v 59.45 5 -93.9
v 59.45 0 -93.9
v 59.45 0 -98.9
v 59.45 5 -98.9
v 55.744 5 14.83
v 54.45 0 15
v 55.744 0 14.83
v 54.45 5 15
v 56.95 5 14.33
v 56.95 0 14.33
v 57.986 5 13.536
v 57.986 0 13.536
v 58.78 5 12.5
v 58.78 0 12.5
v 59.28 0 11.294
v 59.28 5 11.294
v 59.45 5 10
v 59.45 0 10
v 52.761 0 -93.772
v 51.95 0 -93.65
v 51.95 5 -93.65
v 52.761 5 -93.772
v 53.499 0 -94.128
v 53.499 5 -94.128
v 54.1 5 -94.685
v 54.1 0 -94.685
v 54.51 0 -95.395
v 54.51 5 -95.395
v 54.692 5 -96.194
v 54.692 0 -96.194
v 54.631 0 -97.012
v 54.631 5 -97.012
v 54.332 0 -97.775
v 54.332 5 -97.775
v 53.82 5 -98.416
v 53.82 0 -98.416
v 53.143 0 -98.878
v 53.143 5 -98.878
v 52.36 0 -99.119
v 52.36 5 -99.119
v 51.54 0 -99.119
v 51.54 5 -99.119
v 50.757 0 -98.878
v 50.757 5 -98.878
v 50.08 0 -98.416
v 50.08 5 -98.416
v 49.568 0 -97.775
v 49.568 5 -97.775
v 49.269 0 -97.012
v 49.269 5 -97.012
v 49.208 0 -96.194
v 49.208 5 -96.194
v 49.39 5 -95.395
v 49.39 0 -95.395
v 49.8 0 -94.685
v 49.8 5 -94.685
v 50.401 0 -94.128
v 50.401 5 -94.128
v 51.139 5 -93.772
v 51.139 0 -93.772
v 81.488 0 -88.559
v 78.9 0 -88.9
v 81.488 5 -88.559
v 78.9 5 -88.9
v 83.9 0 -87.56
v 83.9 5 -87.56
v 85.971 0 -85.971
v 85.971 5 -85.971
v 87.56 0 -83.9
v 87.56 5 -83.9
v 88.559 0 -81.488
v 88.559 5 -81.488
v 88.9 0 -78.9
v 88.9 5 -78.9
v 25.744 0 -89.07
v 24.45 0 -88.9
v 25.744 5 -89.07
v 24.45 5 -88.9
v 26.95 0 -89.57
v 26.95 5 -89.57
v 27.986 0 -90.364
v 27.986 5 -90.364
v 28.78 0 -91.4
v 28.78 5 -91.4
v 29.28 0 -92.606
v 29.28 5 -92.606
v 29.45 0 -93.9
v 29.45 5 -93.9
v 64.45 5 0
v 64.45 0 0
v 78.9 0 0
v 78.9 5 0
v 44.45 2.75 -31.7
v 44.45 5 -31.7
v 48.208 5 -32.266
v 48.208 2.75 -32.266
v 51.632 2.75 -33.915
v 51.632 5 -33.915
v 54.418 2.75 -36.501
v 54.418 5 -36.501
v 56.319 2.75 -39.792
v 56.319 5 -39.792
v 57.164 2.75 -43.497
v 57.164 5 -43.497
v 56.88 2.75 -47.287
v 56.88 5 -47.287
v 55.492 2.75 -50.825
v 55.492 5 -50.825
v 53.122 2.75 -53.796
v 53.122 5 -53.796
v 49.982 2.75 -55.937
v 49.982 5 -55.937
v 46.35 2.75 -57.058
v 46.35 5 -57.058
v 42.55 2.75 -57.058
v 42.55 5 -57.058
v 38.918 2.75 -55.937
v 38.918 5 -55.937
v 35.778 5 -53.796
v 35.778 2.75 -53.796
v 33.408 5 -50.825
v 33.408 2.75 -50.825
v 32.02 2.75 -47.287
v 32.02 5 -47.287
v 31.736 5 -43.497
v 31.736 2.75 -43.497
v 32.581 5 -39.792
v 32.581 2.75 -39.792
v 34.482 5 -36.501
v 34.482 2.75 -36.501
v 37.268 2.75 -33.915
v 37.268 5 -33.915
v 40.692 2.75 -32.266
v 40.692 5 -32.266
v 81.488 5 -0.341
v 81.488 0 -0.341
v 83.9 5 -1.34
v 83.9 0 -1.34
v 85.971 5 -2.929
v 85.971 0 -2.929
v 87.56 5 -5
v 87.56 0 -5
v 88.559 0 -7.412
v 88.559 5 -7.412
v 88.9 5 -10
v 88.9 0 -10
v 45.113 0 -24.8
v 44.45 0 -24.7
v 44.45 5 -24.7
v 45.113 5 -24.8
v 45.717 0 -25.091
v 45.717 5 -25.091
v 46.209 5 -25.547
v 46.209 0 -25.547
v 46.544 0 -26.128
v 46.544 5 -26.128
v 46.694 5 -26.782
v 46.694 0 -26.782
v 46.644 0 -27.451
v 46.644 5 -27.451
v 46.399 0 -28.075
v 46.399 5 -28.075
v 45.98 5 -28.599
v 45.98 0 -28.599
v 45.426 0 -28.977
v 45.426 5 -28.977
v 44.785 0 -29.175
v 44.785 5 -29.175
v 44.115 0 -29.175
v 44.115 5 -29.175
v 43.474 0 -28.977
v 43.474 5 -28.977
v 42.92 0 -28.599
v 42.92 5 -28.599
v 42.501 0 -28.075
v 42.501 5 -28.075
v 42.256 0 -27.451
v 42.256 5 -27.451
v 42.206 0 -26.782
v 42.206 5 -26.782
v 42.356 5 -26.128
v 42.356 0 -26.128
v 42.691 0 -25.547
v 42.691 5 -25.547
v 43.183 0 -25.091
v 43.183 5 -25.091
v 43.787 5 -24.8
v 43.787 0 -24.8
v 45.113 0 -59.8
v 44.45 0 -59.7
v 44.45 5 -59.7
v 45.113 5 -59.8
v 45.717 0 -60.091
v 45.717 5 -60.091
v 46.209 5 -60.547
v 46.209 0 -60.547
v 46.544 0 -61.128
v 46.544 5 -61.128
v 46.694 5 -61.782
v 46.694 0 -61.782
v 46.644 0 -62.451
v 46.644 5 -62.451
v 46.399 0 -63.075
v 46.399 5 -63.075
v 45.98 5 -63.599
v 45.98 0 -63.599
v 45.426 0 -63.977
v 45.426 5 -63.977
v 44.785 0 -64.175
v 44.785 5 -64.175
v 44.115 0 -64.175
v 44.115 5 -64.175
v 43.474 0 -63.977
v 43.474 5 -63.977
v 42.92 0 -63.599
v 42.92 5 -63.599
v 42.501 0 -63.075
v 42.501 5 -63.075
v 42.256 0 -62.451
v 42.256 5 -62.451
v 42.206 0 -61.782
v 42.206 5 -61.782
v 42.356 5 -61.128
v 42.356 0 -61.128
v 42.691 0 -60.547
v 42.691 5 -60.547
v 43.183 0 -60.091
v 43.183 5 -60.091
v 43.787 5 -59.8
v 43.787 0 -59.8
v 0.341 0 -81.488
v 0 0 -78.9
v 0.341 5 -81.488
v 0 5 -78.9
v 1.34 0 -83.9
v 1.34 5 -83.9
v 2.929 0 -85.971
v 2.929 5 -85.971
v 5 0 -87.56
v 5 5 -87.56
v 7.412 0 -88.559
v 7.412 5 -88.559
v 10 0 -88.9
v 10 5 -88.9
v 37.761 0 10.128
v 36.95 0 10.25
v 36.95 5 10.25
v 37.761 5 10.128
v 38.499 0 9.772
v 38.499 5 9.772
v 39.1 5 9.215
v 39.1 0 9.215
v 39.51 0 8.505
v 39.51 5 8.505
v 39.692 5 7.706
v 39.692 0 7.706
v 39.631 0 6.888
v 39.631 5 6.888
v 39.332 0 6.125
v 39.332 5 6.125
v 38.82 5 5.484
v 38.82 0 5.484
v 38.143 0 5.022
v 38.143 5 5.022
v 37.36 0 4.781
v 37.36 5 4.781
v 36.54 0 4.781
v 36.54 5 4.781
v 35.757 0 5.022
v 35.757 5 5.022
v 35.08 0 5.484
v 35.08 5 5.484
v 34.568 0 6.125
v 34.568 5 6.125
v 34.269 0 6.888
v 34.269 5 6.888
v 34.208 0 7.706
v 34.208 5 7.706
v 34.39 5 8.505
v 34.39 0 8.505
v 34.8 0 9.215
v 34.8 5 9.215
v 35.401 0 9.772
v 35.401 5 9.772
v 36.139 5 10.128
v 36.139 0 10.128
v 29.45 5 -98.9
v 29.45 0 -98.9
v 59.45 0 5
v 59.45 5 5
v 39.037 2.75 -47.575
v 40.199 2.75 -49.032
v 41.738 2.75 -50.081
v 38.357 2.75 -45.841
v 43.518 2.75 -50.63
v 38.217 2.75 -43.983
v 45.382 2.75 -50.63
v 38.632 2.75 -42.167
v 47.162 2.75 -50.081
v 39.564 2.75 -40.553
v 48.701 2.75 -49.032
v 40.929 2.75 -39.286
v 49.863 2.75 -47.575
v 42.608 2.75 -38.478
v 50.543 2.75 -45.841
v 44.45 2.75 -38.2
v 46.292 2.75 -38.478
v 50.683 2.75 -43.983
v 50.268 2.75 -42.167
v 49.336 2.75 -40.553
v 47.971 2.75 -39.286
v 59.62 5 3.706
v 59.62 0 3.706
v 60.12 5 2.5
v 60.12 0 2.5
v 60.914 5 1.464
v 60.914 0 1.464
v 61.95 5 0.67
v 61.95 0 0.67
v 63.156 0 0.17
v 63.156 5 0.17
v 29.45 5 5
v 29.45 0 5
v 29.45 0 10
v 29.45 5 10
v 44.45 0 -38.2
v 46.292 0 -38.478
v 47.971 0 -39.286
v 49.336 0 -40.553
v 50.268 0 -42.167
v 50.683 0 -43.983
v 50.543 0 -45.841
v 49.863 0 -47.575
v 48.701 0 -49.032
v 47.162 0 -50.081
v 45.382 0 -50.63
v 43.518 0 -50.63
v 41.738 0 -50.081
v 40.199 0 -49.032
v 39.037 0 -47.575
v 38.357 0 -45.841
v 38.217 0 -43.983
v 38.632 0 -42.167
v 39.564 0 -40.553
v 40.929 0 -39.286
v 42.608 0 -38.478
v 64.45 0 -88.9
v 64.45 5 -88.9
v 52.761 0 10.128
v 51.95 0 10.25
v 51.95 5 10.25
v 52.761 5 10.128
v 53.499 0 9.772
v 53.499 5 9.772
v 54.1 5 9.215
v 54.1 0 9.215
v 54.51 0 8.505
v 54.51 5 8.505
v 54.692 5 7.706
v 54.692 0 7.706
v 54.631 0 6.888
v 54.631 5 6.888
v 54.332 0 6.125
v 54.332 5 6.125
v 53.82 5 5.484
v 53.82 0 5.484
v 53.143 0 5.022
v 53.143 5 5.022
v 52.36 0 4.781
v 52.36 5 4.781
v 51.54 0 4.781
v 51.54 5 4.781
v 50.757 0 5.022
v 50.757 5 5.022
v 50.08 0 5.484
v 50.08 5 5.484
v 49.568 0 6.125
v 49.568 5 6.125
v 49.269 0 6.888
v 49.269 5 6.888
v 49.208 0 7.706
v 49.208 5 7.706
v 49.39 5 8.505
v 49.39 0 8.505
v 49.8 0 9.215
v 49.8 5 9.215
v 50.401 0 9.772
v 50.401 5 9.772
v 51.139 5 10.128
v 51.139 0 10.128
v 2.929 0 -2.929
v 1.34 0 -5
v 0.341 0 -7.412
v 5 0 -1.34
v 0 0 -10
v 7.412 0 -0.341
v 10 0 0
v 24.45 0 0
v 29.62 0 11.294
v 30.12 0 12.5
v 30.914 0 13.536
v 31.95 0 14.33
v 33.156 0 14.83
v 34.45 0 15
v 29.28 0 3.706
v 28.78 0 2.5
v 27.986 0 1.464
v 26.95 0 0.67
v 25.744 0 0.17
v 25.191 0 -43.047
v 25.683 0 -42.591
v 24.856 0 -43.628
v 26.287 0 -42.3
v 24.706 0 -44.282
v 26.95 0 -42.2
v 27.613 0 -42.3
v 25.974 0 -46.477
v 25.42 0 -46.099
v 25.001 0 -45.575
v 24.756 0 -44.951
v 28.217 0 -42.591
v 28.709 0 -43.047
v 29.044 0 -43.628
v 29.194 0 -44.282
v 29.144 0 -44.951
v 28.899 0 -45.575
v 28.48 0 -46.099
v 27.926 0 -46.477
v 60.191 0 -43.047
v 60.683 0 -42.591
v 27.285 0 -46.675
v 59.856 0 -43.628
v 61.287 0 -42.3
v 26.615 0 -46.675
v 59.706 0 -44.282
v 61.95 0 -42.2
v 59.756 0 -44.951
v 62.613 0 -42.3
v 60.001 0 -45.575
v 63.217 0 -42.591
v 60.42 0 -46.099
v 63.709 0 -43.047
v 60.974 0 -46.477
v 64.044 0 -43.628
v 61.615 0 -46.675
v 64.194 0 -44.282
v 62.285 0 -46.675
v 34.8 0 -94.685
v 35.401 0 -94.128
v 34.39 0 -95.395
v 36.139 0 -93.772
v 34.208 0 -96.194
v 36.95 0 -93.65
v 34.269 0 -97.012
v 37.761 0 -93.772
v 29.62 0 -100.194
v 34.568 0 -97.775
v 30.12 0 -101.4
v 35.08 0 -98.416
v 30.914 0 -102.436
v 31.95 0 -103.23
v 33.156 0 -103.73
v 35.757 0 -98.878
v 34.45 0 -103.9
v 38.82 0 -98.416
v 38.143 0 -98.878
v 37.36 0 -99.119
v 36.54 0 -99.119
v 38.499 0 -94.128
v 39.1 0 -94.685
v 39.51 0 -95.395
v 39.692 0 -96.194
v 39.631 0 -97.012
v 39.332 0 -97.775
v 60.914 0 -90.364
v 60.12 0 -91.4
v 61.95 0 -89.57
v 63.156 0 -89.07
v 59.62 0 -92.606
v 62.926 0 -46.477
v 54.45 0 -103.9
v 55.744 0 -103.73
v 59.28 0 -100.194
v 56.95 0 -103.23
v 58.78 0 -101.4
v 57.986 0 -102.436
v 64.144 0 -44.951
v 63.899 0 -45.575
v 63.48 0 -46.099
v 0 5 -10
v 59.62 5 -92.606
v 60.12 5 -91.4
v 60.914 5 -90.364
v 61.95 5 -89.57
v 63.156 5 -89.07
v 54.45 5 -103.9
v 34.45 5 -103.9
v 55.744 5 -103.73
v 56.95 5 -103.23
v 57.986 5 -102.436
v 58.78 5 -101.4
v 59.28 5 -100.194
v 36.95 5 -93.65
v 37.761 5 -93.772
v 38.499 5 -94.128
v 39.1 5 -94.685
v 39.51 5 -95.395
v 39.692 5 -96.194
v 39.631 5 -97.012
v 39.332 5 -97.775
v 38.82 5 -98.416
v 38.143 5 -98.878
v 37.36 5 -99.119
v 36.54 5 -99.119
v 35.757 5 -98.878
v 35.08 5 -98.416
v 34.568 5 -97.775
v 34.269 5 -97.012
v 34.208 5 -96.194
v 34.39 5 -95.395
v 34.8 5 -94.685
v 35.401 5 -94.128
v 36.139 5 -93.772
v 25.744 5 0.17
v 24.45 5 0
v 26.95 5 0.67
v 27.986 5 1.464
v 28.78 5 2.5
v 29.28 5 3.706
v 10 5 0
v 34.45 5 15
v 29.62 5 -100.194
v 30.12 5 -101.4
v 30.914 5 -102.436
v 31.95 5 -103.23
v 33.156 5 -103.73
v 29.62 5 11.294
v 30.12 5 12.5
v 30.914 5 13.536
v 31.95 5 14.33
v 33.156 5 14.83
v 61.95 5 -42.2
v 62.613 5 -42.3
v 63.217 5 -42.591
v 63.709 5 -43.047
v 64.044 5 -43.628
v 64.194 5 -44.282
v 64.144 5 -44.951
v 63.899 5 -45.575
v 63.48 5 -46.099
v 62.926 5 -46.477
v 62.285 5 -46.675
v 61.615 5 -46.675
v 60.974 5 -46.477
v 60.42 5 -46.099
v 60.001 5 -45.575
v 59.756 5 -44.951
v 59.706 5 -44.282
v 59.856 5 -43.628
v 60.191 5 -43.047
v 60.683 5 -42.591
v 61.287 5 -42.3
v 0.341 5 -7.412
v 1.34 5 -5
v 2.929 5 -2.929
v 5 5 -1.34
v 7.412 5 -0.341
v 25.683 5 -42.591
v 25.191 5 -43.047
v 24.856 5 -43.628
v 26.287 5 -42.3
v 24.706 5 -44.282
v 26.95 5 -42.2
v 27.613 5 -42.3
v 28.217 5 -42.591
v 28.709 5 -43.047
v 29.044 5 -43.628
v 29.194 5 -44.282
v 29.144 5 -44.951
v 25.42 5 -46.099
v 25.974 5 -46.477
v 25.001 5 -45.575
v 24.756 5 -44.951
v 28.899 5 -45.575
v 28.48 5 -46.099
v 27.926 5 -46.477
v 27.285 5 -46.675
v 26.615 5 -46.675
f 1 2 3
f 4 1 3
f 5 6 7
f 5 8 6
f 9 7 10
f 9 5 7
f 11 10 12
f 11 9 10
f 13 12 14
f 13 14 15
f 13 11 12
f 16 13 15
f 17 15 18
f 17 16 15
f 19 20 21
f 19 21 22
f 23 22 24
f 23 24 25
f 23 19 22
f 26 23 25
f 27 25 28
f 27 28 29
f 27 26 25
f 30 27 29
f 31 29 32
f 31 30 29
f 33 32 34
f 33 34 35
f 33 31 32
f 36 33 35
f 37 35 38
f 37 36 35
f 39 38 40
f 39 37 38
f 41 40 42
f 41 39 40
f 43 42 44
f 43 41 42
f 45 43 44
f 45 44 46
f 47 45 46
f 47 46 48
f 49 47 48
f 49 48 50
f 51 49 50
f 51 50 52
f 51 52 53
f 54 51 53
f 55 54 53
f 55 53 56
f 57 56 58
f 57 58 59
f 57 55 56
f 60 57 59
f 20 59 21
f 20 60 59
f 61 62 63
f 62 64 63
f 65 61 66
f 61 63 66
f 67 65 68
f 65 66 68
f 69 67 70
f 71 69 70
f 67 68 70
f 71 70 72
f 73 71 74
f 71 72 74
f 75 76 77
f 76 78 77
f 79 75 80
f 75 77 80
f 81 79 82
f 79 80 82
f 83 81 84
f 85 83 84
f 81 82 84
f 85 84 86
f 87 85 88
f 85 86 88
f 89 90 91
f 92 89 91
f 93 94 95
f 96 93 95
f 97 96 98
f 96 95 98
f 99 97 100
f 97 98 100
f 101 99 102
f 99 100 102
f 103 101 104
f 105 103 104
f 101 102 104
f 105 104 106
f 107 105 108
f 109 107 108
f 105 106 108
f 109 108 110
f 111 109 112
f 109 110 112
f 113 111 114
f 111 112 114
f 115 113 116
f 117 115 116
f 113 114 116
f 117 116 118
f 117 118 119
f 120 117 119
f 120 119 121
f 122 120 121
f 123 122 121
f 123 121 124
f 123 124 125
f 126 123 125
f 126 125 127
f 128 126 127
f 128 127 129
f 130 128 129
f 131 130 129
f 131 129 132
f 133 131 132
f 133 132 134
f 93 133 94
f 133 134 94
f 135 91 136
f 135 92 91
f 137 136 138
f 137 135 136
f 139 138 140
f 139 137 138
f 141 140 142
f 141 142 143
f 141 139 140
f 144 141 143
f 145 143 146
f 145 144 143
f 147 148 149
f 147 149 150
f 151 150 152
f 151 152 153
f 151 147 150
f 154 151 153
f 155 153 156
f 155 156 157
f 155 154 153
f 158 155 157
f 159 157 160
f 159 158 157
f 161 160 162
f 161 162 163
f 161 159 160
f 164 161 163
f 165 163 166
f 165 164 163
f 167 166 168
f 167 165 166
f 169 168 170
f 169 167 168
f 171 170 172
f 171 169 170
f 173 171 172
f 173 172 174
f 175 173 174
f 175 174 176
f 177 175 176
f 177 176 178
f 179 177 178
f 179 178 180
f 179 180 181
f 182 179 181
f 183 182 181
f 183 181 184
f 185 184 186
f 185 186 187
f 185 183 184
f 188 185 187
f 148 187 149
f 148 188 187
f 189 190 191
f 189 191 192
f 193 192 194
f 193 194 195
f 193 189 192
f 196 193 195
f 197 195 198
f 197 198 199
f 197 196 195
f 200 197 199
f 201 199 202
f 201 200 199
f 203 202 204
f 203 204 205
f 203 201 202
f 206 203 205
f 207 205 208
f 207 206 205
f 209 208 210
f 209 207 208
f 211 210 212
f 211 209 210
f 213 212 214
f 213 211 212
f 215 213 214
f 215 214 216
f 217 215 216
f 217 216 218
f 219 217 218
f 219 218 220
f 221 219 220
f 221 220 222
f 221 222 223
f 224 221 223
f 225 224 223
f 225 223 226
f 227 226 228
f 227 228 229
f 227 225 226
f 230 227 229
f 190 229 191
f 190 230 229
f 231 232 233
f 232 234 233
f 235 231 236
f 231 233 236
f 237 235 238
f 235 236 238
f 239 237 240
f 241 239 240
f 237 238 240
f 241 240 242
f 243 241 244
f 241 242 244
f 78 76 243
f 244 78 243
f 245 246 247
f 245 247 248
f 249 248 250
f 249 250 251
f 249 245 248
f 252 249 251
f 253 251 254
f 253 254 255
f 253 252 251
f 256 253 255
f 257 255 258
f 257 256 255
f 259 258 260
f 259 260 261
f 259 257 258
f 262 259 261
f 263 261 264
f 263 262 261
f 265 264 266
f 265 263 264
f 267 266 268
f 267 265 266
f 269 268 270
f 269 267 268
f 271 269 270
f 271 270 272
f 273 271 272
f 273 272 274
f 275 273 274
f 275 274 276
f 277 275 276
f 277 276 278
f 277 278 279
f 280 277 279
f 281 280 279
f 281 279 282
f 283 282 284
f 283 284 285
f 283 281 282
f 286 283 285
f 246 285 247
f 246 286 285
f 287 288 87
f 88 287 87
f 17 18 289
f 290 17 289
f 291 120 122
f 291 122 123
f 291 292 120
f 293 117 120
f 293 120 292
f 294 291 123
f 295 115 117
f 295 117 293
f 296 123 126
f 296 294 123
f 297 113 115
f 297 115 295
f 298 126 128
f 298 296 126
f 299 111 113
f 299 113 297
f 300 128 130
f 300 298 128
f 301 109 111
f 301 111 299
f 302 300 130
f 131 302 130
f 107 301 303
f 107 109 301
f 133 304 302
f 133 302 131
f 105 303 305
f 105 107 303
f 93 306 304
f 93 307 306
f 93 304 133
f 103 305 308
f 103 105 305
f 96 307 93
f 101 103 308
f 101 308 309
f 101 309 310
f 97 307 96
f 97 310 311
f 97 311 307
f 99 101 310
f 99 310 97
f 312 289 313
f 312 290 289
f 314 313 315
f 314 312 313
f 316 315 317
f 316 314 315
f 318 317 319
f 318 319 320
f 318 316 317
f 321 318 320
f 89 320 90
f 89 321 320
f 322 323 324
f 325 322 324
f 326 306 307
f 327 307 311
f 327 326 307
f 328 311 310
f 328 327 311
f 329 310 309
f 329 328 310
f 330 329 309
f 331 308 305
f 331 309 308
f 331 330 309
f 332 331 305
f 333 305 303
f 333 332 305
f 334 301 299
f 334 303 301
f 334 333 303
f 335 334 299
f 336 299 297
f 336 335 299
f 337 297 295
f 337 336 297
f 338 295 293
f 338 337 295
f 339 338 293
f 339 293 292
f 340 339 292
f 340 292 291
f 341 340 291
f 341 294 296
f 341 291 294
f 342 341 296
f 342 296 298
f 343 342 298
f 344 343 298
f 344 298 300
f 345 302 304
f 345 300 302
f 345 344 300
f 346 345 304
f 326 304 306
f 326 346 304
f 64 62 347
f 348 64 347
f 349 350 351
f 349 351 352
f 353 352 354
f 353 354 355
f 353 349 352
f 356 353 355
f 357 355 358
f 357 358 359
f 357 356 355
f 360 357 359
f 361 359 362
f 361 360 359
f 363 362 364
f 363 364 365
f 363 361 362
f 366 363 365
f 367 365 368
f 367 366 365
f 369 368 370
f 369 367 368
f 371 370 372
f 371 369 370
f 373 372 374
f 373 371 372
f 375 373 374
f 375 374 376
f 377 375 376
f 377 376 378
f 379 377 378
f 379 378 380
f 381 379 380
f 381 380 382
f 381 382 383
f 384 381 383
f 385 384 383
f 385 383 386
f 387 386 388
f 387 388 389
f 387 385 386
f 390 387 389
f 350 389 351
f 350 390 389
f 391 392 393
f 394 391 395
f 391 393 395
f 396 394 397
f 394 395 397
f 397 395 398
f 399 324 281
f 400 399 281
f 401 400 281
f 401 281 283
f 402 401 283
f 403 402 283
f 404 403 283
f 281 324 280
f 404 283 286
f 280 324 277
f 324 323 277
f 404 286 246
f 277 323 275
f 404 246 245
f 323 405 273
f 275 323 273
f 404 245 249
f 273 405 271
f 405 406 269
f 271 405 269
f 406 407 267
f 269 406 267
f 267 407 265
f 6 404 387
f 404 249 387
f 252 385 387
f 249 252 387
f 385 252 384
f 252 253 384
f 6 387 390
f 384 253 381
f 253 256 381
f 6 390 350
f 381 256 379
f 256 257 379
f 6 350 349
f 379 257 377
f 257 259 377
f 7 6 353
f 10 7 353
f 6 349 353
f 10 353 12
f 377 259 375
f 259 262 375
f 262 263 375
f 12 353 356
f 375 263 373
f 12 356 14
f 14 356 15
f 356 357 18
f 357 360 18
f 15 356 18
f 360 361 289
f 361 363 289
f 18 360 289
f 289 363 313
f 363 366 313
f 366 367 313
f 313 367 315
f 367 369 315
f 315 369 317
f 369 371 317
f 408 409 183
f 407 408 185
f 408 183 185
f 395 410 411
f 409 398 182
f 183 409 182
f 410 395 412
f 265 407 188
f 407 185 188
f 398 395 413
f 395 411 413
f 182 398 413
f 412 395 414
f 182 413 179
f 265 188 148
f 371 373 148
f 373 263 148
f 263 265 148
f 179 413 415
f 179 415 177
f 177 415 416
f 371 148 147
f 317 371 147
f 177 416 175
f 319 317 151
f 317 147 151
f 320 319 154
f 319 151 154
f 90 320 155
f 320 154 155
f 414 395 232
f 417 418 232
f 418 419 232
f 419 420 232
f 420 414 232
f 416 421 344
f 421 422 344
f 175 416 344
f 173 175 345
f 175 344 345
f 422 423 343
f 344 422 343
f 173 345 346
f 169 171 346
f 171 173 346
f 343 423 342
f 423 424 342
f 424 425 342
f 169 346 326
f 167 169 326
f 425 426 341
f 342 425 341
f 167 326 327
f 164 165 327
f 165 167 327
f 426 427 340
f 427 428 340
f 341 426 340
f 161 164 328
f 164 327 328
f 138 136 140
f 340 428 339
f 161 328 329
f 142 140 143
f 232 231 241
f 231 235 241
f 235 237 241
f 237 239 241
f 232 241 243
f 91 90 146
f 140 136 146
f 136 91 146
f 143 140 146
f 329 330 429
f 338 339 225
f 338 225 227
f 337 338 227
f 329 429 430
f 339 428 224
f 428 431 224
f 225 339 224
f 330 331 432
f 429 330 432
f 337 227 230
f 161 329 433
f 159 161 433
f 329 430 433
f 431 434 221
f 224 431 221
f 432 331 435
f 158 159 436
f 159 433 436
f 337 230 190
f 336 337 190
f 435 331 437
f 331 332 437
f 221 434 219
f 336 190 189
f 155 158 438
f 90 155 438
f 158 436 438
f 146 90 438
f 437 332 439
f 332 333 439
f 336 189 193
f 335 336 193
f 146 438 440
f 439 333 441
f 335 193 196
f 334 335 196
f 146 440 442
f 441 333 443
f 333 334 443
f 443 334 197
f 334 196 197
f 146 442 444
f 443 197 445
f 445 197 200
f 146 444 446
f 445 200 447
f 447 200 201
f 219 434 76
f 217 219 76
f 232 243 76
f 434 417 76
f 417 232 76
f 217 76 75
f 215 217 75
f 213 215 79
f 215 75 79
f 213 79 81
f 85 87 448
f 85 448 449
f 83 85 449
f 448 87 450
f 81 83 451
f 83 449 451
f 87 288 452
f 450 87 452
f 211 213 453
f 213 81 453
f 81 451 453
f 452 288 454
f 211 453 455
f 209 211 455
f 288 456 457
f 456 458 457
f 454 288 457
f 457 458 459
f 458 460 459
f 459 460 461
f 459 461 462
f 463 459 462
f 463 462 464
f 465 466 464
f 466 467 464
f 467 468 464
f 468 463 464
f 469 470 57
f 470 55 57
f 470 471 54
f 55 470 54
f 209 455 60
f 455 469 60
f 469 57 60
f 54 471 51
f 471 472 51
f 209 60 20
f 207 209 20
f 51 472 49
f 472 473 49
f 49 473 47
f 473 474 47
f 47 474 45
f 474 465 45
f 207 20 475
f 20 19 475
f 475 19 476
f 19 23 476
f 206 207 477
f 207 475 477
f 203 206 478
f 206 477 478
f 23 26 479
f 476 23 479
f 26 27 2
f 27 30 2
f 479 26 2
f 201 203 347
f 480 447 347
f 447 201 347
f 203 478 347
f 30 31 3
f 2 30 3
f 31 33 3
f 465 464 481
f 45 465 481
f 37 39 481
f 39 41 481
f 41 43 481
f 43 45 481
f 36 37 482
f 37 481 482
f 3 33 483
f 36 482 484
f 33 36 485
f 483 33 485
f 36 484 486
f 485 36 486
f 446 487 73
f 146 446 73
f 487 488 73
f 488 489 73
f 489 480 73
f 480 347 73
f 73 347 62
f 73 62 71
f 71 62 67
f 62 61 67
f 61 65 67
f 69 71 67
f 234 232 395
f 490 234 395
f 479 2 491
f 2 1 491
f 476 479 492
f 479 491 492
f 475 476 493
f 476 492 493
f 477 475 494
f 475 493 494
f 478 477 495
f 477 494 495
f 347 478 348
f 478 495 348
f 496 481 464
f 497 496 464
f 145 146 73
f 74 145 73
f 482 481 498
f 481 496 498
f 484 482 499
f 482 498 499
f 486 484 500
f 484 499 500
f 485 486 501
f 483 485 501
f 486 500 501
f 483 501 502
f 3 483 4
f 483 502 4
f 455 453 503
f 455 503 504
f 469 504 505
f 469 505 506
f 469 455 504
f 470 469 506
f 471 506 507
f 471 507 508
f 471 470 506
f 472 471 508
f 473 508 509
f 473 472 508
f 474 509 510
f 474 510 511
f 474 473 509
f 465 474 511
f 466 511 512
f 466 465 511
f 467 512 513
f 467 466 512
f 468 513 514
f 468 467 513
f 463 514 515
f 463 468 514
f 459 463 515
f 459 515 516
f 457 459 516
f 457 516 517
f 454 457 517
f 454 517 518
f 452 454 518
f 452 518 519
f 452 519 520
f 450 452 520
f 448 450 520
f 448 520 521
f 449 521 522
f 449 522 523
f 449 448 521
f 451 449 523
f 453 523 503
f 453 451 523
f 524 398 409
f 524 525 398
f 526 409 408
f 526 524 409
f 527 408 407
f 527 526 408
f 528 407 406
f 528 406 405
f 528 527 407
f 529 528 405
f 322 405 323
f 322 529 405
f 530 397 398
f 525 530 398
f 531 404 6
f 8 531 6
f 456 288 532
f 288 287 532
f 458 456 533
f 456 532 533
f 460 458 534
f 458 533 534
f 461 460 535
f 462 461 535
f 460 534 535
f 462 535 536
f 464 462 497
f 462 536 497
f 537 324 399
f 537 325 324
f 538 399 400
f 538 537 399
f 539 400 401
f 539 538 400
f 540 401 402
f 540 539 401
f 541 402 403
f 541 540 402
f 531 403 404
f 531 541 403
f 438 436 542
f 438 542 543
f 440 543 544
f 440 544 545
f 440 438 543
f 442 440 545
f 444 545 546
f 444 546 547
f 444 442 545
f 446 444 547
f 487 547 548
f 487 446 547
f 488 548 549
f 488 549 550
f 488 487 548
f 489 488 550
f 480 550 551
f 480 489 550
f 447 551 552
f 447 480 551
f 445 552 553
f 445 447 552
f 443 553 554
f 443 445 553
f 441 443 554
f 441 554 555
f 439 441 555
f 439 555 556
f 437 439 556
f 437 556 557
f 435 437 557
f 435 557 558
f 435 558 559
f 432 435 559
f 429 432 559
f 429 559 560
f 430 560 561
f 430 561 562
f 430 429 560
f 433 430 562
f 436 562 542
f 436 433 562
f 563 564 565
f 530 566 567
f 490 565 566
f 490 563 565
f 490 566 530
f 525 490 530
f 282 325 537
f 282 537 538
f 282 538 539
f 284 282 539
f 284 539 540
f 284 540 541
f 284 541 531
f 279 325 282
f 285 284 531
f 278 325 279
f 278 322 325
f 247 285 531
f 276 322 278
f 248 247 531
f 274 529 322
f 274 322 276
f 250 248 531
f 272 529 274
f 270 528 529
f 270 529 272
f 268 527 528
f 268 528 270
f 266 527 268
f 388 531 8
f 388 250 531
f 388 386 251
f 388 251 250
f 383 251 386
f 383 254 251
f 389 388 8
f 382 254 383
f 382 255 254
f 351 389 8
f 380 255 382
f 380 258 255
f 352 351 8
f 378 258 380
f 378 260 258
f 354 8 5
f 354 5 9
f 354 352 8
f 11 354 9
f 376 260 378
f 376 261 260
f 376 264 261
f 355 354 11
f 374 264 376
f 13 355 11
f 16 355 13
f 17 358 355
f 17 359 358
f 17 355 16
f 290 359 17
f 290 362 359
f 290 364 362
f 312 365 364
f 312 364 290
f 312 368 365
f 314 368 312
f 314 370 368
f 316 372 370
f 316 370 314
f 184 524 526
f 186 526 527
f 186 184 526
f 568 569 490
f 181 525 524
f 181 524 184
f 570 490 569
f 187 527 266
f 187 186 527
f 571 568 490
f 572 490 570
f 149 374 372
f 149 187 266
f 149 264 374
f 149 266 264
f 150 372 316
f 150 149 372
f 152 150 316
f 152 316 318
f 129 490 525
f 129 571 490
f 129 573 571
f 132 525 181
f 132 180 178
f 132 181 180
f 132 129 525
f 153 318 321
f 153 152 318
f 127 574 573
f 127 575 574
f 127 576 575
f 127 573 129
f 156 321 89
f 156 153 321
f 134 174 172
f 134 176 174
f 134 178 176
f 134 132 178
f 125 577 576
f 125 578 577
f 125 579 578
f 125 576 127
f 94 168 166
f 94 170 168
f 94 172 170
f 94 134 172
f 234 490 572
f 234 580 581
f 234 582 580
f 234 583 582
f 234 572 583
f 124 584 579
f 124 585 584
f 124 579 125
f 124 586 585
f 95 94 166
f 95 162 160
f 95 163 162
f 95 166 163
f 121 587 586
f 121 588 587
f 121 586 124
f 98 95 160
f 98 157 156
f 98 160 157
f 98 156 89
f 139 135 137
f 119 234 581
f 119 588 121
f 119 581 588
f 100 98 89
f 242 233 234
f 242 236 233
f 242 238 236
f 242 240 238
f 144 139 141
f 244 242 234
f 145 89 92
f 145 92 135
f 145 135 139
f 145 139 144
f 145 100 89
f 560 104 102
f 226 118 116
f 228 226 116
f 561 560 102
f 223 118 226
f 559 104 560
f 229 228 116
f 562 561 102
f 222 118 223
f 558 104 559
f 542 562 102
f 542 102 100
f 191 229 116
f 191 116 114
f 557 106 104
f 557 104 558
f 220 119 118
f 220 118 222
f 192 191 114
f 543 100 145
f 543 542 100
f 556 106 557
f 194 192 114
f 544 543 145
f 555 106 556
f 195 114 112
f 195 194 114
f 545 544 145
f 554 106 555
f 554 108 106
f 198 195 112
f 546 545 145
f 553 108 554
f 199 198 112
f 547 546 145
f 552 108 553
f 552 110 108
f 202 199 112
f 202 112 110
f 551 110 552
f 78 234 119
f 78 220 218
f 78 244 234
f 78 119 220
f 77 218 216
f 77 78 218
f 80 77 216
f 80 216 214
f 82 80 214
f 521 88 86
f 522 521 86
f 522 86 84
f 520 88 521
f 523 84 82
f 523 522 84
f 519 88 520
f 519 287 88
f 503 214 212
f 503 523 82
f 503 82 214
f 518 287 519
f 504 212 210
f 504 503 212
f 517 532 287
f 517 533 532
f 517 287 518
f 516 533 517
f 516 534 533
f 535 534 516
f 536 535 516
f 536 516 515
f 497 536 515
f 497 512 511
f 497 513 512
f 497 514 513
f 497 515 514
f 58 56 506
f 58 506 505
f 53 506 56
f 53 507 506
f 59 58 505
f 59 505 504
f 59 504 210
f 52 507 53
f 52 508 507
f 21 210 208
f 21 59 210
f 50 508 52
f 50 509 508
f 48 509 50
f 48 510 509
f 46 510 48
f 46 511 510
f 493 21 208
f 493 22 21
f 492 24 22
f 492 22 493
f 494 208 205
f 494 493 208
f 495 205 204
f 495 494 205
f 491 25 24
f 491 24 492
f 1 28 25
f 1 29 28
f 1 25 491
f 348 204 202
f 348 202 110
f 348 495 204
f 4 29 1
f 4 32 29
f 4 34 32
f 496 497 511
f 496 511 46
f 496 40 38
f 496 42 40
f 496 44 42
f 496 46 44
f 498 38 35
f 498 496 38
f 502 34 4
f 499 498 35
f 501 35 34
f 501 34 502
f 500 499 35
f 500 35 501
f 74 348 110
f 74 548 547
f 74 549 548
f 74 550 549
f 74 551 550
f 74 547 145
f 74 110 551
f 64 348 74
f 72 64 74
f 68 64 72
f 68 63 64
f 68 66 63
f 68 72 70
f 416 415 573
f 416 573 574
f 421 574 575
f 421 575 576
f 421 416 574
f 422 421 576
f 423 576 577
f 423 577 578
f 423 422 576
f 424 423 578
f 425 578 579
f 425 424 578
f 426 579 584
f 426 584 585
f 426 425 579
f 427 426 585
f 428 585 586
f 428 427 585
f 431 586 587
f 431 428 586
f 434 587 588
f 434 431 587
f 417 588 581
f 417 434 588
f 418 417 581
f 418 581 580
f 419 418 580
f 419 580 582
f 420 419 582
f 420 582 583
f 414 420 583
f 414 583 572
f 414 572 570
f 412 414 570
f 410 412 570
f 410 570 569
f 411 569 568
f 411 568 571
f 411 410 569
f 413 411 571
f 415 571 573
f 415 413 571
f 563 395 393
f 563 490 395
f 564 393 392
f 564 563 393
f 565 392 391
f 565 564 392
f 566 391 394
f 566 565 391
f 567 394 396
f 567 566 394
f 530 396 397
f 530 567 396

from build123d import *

# Parameters (mm, degrees)
SKETCH1_R           = 2.25
SKETCH1_R_2         = 2.75
SKETCH1_R_3         = 6.25
BOSS_EXTRUDE1_DEPTH = 5
FILLET1_R           = 10
FILLET2_R           = 5
SKETCH2_R           = 12.75
CUT_EXTRUDE1_DEPTH  = 2.25


with BuildPart() as part:
    # Sketch1 → Boss-Extrude1 (new body)
    with BuildSketch(Plane(origin=(0, 0, 0), x_dir=(1, 0, 0), z_dir=(0, 1, 0))):
        Polygon((0, 88.9), (0, 0), (29.45, 0), (29.45, -15), (59.45, -15), (59.45, 0), (88.9, 0), (88.9, 88.9), (59.45, 88.9), (59.45, 103.9), (29.45, 103.9), (29.45, 88.9), align=None)
        with Locations(Location((61.95, 44.45, 0), (0, 0, 270))):
            Circle(SKETCH1_R, mode=Mode.SUBTRACT)
        with Locations(Location((44.45, 26.95, 0), (0, 0, 270))):
            Circle(SKETCH1_R, mode=Mode.SUBTRACT)
        with Locations(Location((26.95, 44.45, 0), (0, 0, 270))):
            Circle(SKETCH1_R, mode=Mode.SUBTRACT)
        with Locations(Location((44.45, 61.95, 0), (0, 0, 270))):
            Circle(SKETCH1_R, mode=Mode.SUBTRACT)
        with Locations(Location((36.95, -7.5, 0), (0, 0, 270))):
            Circle(SKETCH1_R_2, mode=Mode.SUBTRACT)
        with Locations(Location((51.95, -7.5, 0), (0, 0, 270))):
            Circle(SKETCH1_R_2, mode=Mode.SUBTRACT)
        with Locations(Location((36.95, 96.4, 0), (0, 0, 270))):
            Circle(SKETCH1_R_2, mode=Mode.SUBTRACT)
        with Locations(Location((51.95, 96.4, 0), (0, 0, 270))):
            Circle(SKETCH1_R_2, mode=Mode.SUBTRACT)
        with Locations(Location((44.45, 44.45, 0), (0, 0, 270))):
            Circle(SKETCH1_R_3, mode=Mode.SUBTRACT)
    extrude(amount=BOSS_EXTRUDE1_DEPTH)

    # Fillet1
    fillet1_edges = [part.edges().sort_by_distance(p)[0] for p in [
        (0, 2.5, 0),
        (0, 2.5, -88.9),
        (88.9, 2.5, -88.9),
        (88.9, 2.5, 0),
    ]]
    fillet(fillet1_edges, radius=FILLET1_R)

    # Fillet2
    fillet2_edges = [part.edges().sort_by_distance(p)[0] for p in [
        (29.45, 2.5, 15),
        (29.45, 2.5, 0),
        (29.45, 2.5, -88.9),
        (29.45, 2.5, -103.9),
        (59.45, 2.5, -103.9),
        (59.45, 2.5, -88.9),
        (59.45, 2.5, 0),
        (59.45, 2.5, 15),
    ]]
    fillet(fillet2_edges, radius=FILLET2_R)

    # Sketch2 → Cut-Extrude1 (cut)
    with BuildSketch(Plane(origin=(0, 5, 0), x_dir=(1, 0, 0), z_dir=(0, 1, 0))):
        with Locations(Location((44.45, 44.45, 0), (0, 0, 270))):
            Circle(SKETCH2_R)
    extrude(amount=-CUT_EXTRUDE1_DEPTH, mode=Mode.SUBTRACT)


solid = part.part
